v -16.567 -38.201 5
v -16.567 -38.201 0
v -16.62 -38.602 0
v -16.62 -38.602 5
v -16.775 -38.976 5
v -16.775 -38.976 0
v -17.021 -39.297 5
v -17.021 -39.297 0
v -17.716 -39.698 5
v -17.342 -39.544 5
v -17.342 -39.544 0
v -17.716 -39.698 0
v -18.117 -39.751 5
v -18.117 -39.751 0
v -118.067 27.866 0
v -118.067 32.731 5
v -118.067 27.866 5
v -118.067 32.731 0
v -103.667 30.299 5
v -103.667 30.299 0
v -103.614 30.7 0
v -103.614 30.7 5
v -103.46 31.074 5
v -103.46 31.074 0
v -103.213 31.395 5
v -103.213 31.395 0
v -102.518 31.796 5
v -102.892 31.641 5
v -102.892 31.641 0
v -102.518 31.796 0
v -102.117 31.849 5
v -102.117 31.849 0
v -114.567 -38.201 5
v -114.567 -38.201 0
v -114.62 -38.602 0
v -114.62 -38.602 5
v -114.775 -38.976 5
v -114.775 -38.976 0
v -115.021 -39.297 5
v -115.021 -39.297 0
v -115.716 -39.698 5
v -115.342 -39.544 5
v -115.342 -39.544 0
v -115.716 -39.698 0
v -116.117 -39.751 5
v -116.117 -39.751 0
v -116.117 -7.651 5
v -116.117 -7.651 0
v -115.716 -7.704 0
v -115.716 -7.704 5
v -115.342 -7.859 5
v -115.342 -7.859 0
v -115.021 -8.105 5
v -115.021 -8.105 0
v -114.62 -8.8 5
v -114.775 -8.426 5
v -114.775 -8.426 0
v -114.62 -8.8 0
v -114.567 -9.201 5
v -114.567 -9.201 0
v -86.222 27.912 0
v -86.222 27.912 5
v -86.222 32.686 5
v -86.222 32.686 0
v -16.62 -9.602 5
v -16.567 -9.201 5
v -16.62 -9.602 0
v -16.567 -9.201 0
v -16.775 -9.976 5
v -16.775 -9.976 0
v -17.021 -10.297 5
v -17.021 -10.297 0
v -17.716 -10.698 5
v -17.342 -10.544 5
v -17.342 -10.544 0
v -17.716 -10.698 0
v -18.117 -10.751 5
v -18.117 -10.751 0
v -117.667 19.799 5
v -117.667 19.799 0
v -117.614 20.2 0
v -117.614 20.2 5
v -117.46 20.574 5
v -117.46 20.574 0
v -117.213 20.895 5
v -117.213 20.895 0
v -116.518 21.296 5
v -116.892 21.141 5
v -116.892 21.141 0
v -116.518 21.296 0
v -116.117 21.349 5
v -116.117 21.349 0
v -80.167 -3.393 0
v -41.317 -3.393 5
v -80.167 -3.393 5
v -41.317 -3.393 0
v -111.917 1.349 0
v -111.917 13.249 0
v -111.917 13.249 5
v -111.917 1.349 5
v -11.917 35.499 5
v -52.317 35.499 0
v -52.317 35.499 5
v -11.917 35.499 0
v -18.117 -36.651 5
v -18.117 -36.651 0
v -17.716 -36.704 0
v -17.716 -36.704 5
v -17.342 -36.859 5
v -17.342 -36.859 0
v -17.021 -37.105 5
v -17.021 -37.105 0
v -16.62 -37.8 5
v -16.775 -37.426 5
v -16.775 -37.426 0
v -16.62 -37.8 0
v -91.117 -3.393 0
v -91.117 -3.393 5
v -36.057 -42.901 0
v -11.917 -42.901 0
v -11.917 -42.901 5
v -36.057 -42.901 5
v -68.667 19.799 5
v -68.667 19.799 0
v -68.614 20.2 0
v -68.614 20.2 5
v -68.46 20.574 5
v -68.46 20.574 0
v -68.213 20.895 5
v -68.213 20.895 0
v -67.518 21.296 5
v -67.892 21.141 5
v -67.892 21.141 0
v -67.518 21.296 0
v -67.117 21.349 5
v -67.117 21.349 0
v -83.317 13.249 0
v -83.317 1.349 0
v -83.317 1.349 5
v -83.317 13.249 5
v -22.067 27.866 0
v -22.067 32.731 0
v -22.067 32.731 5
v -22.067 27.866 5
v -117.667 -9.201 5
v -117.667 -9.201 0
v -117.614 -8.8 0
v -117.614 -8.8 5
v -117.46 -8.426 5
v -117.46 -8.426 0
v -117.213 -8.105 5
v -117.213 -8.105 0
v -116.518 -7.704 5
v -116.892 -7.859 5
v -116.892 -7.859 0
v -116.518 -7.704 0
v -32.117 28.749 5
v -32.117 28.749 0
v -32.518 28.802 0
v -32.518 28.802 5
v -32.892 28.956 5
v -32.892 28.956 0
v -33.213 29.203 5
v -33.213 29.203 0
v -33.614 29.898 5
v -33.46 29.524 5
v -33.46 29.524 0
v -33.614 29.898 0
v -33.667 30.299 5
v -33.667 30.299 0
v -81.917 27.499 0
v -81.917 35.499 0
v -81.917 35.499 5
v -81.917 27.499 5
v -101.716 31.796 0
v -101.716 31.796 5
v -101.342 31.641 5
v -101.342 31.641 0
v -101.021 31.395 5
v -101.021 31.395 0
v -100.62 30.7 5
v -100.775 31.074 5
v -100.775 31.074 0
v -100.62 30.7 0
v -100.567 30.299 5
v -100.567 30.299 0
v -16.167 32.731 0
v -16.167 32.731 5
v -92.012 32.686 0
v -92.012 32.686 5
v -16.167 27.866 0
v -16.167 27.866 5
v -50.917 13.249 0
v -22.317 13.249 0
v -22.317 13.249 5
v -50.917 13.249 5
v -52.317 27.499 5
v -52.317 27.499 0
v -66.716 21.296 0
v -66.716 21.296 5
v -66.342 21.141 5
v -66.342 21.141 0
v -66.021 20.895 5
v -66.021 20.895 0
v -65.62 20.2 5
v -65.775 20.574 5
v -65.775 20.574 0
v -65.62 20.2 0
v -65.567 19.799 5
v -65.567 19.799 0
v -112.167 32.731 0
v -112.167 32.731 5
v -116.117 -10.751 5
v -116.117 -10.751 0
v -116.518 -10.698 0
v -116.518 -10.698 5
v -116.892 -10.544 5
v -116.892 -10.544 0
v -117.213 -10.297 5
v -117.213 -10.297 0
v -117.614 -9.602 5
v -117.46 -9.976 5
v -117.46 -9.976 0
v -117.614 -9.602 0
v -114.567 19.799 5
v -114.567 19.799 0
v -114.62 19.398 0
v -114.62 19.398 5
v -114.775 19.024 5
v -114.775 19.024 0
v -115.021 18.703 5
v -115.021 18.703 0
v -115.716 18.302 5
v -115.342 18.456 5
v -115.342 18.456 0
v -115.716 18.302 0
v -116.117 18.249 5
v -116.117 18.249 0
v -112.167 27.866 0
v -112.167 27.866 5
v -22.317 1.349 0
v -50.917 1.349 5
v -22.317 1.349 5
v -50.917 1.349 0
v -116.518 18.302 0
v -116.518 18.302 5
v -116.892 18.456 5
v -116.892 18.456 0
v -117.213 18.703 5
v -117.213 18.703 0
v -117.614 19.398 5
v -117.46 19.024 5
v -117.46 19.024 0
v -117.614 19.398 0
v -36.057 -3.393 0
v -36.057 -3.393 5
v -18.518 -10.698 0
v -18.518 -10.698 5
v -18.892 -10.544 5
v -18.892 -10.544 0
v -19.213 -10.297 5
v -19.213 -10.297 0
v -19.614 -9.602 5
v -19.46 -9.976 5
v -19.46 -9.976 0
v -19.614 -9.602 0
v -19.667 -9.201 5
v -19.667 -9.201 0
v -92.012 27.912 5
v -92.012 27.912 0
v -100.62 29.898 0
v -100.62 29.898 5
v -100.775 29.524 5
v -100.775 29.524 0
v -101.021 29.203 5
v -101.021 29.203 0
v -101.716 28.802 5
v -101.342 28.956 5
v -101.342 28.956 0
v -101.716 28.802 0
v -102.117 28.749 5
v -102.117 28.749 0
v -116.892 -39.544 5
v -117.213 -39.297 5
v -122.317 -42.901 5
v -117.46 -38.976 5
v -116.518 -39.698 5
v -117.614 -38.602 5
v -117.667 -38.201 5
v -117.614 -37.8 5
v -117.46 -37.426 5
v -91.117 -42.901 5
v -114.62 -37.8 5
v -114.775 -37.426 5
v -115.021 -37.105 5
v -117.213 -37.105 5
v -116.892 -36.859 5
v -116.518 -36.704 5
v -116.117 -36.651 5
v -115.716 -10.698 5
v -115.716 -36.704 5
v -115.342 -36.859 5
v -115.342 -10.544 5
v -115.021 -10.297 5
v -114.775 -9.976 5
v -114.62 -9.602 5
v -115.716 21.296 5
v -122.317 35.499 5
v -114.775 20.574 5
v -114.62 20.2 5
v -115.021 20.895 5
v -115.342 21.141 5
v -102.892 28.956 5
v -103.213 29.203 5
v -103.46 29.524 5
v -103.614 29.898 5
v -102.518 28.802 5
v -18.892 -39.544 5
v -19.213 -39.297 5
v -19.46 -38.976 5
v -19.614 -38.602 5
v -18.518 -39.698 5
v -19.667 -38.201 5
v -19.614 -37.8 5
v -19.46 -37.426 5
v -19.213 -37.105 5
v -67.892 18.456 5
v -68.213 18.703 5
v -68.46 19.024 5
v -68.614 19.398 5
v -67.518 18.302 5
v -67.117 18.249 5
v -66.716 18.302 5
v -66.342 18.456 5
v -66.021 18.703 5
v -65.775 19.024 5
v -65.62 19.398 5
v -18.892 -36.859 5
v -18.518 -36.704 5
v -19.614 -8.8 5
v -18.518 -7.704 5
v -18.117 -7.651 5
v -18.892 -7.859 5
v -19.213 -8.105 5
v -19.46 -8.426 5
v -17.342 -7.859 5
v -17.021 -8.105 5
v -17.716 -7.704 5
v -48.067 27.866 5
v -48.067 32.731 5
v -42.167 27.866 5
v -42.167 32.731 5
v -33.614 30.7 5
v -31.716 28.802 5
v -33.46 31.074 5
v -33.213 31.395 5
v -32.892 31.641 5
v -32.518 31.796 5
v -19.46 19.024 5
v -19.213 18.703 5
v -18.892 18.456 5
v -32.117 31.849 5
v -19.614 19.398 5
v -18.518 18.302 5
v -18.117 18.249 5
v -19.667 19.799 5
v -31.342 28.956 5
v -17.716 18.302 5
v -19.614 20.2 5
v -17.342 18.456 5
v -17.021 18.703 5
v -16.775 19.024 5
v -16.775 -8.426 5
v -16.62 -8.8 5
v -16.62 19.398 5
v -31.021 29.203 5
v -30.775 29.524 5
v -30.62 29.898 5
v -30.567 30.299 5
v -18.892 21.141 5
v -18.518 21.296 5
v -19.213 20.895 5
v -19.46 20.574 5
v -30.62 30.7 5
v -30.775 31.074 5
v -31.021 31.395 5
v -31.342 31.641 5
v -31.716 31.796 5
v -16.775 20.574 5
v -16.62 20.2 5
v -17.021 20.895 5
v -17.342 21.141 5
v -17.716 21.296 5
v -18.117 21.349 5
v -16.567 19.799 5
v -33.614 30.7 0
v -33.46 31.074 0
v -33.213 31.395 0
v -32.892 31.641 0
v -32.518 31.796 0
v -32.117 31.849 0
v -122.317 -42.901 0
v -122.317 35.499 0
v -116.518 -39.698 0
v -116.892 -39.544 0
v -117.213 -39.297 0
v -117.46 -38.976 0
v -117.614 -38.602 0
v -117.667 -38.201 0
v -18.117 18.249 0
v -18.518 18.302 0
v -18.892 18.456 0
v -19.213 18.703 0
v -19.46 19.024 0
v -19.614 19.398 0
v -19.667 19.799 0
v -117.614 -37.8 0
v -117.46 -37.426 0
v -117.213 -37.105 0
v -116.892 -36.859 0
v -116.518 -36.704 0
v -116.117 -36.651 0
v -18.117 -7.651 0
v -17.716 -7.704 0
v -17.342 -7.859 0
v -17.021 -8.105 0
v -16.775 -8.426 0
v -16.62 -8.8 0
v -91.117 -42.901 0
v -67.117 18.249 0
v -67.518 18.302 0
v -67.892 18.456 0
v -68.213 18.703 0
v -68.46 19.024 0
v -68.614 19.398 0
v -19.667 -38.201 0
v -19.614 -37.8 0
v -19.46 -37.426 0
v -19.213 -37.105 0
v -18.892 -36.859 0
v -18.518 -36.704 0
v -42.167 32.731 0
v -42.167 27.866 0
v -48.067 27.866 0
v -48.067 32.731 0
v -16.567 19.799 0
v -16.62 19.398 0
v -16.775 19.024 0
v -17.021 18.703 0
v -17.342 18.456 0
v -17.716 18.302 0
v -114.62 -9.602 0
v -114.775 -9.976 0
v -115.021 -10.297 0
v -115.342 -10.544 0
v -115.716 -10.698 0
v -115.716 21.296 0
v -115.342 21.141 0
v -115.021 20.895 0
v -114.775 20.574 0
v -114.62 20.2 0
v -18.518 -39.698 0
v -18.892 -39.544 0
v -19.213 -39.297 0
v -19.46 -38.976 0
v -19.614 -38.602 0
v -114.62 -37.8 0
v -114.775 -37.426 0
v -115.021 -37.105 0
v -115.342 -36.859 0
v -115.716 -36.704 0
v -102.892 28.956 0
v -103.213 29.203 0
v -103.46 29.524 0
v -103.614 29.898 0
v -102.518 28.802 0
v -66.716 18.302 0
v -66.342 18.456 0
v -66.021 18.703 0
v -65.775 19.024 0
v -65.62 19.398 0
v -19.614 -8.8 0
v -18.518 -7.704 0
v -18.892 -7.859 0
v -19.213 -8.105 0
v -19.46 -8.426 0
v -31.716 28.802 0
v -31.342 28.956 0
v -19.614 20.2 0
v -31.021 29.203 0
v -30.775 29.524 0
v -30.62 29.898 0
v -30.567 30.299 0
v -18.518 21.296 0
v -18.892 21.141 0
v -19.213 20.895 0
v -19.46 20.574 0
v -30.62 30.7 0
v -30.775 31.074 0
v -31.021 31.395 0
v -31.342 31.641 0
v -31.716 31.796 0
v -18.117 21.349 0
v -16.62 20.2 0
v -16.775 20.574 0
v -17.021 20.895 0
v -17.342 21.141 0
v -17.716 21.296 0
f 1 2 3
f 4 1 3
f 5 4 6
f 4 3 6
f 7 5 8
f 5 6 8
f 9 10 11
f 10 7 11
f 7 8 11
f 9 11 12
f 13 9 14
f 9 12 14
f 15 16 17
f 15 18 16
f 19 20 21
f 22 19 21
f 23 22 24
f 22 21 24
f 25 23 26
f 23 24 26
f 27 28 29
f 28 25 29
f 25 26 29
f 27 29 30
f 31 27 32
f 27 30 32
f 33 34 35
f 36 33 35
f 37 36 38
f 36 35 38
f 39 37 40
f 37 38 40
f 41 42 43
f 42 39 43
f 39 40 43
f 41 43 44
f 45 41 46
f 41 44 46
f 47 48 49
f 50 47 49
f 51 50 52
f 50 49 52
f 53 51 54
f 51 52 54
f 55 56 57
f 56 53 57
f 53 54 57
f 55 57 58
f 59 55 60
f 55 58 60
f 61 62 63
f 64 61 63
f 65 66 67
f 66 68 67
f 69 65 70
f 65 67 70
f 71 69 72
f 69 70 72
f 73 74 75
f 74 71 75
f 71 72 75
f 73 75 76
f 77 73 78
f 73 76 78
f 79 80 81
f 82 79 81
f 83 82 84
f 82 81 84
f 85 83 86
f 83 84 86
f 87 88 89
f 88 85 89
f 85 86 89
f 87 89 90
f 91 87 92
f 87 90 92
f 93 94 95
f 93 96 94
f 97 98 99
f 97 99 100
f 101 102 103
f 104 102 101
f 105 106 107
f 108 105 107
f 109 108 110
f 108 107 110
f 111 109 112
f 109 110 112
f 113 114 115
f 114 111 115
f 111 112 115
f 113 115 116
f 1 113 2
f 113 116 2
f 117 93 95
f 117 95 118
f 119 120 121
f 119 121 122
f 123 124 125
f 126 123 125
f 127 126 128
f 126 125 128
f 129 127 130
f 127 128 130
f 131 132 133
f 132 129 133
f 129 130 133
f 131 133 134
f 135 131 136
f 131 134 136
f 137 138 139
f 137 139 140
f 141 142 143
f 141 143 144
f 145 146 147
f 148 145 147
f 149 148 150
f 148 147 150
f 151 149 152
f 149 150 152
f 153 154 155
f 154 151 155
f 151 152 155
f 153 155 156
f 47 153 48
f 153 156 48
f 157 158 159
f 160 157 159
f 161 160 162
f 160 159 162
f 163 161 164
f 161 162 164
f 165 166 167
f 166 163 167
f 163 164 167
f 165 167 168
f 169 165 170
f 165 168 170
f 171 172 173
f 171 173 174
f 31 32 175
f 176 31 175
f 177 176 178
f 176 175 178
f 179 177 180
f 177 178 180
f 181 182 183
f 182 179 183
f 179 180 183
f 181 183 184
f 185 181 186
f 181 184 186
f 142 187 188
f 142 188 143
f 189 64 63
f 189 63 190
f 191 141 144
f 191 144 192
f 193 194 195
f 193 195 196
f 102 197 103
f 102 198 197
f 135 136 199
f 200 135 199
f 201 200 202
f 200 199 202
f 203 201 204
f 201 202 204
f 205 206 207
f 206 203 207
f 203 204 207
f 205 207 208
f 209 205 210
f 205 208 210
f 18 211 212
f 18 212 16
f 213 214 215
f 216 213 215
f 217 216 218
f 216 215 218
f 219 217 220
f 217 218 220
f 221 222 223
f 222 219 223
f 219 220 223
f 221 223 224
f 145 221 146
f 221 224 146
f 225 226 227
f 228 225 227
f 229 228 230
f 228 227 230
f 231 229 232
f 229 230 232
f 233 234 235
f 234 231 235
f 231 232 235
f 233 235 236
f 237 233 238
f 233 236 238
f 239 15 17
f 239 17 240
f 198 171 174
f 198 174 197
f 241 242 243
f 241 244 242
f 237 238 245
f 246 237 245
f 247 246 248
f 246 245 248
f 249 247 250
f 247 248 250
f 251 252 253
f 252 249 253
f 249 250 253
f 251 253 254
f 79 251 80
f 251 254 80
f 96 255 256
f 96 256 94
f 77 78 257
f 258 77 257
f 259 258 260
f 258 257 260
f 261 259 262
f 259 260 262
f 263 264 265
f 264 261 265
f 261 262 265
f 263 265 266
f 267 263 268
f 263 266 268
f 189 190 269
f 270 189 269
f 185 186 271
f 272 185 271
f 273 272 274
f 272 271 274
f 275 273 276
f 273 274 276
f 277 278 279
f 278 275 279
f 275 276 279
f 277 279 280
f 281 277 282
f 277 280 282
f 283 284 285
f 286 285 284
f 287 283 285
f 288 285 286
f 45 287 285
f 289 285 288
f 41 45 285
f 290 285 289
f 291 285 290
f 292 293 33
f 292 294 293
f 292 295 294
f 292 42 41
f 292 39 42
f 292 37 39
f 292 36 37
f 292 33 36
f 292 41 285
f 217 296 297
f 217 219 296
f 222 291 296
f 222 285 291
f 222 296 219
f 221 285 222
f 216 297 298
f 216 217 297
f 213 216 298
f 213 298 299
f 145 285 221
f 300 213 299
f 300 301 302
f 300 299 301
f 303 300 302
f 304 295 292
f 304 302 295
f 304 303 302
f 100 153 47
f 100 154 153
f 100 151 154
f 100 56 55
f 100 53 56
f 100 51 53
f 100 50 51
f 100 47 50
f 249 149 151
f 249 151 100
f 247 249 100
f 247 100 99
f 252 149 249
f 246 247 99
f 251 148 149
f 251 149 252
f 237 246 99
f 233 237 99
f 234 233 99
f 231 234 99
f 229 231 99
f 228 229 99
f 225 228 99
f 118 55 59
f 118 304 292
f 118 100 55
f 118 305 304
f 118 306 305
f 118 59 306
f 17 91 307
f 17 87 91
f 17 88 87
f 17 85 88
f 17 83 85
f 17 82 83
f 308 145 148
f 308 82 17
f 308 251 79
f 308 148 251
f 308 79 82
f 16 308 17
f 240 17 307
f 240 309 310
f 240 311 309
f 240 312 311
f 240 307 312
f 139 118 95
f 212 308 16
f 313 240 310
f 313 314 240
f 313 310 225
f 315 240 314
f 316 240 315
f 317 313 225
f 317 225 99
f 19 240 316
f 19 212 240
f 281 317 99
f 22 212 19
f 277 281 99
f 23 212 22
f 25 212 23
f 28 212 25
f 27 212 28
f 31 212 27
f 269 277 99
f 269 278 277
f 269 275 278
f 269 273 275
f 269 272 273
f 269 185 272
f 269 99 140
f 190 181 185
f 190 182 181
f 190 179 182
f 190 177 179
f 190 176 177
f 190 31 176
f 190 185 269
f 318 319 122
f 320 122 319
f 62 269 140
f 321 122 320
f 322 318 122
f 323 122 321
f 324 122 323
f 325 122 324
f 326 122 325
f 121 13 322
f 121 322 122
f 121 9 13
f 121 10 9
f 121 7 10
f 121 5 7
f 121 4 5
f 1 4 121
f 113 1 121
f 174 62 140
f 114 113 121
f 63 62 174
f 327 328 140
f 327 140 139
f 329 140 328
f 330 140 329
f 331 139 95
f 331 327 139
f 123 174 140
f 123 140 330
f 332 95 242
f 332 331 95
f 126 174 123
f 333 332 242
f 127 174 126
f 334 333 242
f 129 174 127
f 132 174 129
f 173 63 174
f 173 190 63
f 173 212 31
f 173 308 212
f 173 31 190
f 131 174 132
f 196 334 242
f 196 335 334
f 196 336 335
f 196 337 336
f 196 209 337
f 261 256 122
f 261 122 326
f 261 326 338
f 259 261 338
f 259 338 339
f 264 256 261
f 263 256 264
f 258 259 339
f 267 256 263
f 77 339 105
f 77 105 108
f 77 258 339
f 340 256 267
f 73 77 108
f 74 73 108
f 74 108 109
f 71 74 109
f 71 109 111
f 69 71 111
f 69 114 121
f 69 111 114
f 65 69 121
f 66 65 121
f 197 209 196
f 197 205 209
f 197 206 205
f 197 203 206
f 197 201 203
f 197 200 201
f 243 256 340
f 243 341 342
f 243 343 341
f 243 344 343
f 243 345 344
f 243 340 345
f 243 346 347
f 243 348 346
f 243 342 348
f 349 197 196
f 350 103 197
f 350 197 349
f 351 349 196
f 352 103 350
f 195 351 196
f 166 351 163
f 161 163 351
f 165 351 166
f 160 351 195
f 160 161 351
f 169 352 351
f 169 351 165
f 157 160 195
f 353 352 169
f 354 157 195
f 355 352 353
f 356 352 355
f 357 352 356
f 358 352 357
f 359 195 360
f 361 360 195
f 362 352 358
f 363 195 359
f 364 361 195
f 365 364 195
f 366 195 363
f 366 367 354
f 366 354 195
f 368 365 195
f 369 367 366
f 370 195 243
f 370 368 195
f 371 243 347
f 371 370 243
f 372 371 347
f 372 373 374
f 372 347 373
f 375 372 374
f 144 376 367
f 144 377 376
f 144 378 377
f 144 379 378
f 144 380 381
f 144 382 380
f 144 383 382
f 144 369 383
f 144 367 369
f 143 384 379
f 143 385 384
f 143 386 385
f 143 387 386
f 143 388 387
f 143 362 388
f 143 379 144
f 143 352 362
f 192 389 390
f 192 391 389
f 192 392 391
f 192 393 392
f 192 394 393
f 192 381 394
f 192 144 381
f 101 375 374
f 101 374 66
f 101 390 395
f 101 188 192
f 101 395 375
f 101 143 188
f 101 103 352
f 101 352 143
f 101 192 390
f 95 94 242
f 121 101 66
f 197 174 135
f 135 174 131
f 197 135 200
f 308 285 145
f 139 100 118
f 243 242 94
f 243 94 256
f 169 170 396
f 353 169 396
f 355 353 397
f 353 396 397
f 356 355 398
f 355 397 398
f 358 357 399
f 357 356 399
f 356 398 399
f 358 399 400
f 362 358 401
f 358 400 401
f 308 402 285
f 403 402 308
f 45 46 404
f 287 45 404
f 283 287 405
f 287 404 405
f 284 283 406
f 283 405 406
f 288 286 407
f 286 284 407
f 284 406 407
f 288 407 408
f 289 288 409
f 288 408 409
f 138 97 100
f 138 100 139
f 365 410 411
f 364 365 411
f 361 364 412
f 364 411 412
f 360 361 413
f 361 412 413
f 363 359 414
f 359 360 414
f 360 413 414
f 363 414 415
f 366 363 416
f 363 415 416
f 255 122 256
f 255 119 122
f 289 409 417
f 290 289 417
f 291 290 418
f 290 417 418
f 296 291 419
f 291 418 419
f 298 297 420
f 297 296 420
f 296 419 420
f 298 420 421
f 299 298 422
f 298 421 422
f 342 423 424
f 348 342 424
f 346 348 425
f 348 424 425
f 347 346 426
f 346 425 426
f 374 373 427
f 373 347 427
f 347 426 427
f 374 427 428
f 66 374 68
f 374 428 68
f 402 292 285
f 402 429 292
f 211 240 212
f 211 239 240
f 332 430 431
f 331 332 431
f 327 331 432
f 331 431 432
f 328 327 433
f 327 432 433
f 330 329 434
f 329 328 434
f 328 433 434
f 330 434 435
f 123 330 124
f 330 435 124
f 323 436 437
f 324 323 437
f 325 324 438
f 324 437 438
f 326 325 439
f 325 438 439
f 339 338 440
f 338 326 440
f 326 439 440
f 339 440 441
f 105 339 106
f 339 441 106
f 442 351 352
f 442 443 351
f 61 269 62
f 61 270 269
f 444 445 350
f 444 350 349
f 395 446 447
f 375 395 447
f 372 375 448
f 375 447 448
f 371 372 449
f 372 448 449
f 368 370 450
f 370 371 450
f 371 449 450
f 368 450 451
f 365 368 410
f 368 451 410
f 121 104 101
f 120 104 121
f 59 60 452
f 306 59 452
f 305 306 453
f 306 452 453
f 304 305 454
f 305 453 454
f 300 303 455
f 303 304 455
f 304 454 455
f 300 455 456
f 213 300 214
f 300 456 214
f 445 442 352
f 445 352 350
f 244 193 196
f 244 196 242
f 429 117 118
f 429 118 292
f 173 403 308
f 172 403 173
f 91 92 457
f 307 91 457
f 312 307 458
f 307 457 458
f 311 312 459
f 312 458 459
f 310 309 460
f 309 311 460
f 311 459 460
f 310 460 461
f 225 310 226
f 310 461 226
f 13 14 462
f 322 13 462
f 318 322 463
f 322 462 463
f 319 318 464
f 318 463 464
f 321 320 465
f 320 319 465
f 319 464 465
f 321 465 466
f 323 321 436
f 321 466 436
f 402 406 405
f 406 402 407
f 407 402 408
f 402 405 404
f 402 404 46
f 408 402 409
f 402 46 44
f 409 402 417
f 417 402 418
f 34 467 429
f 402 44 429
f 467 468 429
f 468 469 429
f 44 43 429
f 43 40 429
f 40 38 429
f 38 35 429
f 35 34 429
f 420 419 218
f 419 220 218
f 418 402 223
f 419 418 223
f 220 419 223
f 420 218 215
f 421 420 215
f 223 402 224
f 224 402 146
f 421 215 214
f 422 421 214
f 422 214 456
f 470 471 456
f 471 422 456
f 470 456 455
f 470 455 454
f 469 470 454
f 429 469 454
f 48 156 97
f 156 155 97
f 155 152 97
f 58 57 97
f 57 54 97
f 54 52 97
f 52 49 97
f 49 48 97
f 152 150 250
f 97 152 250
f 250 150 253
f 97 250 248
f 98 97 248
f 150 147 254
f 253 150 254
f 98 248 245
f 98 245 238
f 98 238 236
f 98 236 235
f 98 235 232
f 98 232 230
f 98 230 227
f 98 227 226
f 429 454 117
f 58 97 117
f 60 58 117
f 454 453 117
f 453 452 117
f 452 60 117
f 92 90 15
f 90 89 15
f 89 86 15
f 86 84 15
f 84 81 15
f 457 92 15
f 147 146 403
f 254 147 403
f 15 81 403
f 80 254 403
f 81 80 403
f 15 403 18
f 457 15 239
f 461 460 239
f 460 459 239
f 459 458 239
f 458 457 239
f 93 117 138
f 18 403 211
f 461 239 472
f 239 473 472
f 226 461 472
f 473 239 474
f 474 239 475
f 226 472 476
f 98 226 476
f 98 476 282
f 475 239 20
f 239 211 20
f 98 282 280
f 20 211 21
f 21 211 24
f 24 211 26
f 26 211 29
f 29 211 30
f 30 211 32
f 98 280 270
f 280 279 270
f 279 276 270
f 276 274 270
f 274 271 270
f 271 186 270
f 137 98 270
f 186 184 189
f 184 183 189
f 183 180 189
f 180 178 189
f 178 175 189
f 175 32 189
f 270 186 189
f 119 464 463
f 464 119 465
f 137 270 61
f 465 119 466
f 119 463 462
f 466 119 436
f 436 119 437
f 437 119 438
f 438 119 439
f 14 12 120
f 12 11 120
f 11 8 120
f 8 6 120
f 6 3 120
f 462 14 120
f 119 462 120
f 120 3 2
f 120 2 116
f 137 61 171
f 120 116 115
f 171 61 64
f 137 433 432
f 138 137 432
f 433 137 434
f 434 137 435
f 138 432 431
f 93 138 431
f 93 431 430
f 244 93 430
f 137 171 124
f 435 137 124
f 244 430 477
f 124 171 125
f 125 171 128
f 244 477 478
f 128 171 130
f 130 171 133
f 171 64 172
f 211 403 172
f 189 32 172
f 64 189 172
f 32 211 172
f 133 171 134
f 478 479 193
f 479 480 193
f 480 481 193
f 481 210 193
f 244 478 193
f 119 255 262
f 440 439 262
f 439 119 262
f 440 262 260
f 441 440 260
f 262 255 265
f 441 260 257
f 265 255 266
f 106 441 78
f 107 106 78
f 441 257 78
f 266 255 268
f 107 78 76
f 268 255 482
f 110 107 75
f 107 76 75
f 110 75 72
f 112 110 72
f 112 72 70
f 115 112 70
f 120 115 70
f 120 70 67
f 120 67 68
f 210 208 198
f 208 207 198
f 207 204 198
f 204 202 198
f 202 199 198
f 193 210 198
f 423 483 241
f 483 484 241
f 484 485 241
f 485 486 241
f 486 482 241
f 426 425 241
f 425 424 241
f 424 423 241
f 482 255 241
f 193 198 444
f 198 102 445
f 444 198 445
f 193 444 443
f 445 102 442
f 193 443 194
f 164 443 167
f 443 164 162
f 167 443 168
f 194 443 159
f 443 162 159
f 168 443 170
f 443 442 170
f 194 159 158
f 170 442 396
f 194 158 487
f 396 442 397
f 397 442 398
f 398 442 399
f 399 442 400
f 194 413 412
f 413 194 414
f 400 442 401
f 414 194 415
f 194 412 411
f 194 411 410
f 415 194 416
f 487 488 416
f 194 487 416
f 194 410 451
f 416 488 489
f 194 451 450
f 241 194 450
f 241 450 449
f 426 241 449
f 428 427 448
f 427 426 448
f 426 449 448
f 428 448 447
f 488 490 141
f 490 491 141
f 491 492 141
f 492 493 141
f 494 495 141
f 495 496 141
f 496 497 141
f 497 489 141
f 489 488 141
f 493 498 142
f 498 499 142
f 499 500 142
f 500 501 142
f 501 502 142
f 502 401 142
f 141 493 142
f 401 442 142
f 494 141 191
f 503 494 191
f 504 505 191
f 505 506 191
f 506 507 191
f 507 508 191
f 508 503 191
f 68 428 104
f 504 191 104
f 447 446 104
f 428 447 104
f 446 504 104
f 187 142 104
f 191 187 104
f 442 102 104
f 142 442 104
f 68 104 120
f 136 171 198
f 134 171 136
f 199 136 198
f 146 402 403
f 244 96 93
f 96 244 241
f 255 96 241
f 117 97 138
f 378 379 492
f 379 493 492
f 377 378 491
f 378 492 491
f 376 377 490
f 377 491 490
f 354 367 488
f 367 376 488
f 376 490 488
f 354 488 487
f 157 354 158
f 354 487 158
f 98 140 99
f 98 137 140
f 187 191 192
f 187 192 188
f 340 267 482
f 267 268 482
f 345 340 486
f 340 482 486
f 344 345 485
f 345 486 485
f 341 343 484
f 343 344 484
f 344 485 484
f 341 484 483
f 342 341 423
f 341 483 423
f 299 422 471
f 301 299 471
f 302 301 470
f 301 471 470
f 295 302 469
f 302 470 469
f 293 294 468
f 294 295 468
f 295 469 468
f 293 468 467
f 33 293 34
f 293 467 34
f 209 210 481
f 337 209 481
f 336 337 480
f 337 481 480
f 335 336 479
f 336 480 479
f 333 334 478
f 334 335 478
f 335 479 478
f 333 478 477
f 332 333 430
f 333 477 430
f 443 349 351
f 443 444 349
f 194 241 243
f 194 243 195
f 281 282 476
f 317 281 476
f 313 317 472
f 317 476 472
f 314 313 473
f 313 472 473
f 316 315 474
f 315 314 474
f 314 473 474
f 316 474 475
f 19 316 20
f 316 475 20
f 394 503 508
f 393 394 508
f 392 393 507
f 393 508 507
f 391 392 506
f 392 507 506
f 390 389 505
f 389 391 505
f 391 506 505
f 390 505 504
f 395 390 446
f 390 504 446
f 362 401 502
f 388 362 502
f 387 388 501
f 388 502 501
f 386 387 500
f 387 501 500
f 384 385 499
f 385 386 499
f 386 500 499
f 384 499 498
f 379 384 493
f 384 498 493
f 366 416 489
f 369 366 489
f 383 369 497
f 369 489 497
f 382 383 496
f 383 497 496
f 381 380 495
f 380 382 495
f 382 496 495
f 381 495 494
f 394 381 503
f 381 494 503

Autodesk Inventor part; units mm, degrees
ref_plane "YZ Plane" through (0, 0, 0) normal (1, 0, 0) x (0, 1, 0)
ref_plane "XZ Plane" through (0, 0, 0) normal (0, 1, 0) x (-1, 0, 0)
ref_plane "XY Plane" through (0, 0, 0) normal (0, 0, 1) x (1, 0, 0)
sketch "Boceto1" plane through (0, 0, 0) normal (0, 0, 1) x (1, 0, 0)
  arc A0 (-116.1173, 21.3488) -> (-117.6673, 19.7988) centre (-116.1173, 19.7988) ccw
  arc A1 (-117.6673, 19.7988) -> (-116.1173, 18.2488) centre (-116.1173, 19.7988) ccw
  arc A2 (-116.1173, 18.2488) -> (-114.5673, 19.7988) centre (-116.1173, 19.7988) ccw
  arc A3 (-114.5673, 19.7988) -> (-116.1173, 21.3488) centre (-116.1173, 19.7988) ccw
  arc A4 (-67.1173, 21.3488) -> (-68.6673, 19.7988) centre (-67.1173, 19.7988) ccw
  arc A5 (-68.6673, 19.7988) -> (-67.1173, 18.2488) centre (-67.1173, 19.7988) ccw
  arc A6 (-67.1173, 18.2488) -> (-65.5673, 19.7988) centre (-67.1173, 19.7988) ccw
  arc A7 (-65.5673, 19.7988) -> (-67.1173, 21.3488) centre (-67.1173, 19.7988) ccw
  arc A8 (-18.1173, 21.3488) -> (-19.6673, 19.7988) centre (-18.1173, 19.7988) ccw
  arc A9 (-19.6673, 19.7988) -> (-18.1173, 18.2488) centre (-18.1173, 19.7988) ccw
  arc A10 (-18.1173, 18.2488) -> (-16.5673, 19.7988) centre (-18.1173, 19.7988) ccw
  arc A11 (-16.5673, 19.7988) -> (-18.1173, 21.3488) centre (-18.1173, 19.7988) ccw
  arc A12 (-18.1173, -7.6512) -> (-19.6673, -9.2012) centre (-18.1173, -9.2012) ccw
  arc A13 (-19.6673, -9.2012) -> (-18.1173, -10.7512) centre (-18.1173, -9.2012) ccw
  arc A14 (-18.1173, -10.7512) -> (-16.5673, -9.2012) centre (-18.1173, -9.2012) ccw
  arc A15 (-16.5673, -9.2012) -> (-18.1173, -7.6512) centre (-18.1173, -9.2012) ccw
  arc A16 (-116.1173, -7.6512) -> (-117.6673, -9.2012) centre (-116.1173, -9.2012) ccw
  arc A17 (-117.6673, -9.2012) -> (-116.1173, -10.7512) centre (-116.1173, -9.2012) ccw
  arc A18 (-116.1173, -10.7512) -> (-114.5673, -9.2012) centre (-116.1173, -9.2012) ccw
  arc A19 (-114.5673, -9.2012) -> (-116.1173, -7.6512) centre (-116.1173, -9.2012) ccw
  arc A20 (-116.1173, -36.6512) -> (-117.6673, -38.2012) centre (-116.1173, -38.2012) ccw
  arc A21 (-117.6673, -38.2012) -> (-116.1173, -39.7512) centre (-116.1173, -38.2012) ccw
  arc A22 (-116.1173, -39.7512) -> (-114.5673, -38.2012) centre (-116.1173, -38.2012) ccw
  arc A23 (-114.5673, -38.2012) -> (-116.1173, -36.6512) centre (-116.1173, -38.2012) ccw
  arc A24 (-18.1173, -36.6512) -> (-19.6673, -38.2012) centre (-18.1173, -38.2012) ccw
  arc A25 (-19.6673, -38.2012) -> (-18.1173, -39.7512) centre (-18.1173, -38.2012) ccw
  arc A26 (-18.1173, -39.7512) -> (-16.5673, -38.2012) centre (-18.1173, -38.2012) ccw
  arc A27 (-16.5673, -38.2012) -> (-18.1173, -36.6512) centre (-18.1173, -38.2012) ccw
  arc A28 (-102.1173, 31.8488) -> (-103.6673, 30.2988) centre (-102.1173, 30.2988) ccw
  arc A29 (-103.6673, 30.2988) -> (-102.1173, 28.7488) centre (-102.1173, 30.2988) ccw
  arc A30 (-102.1173, 28.7488) -> (-100.5673, 30.2988) centre (-102.1173, 30.2988) ccw
  arc A31 (-100.5673, 30.2988) -> (-102.1173, 31.8488) centre (-102.1173, 30.2988) ccw
  arc A32 (-32.1173, 31.8488) -> (-33.6673, 30.2988) centre (-32.1173, 30.2988) ccw
  arc A33 (-33.6673, 30.2988) -> (-32.1173, 28.7488) centre (-32.1173, 30.2988) ccw
  arc A34 (-32.1173, 28.7488) -> (-30.5673, 30.2988) centre (-32.1173, 30.2988) ccw
  arc A35 (-30.5673, 30.2988) -> (-32.1173, 31.8488) centre (-32.1173, 30.2988) ccw
  line L0 (-22.3173, 1.3488) -> (-22.3173, 13.2488)
  line L1 (-22.3173, 13.2488) -> (-50.9173, 13.2488)
  line L2 (-50.9173, 13.2488) -> (-50.9173, 1.3488)
  line L3 (-50.9173, 1.3488) -> (-22.3173, 1.3488)
  line L4 (-83.3173, 1.3488) -> (-83.3173, 13.2488)
  line L5 (-83.3173, 13.2488) -> (-111.9173, 13.2488)
  line L6 (-111.9173, 13.2488) -> (-111.9173, 1.3488)
  line L7 (-111.9173, 1.3488) -> (-83.3173, 1.3488)
  line L8 (-86.2223, 27.9117) -> (-86.2223, 32.6859)
  line L9 (-86.2223, 32.6859) -> (-92.0123, 32.6859)
  line L10 (-92.0123, 32.6859) -> (-92.0123, 27.9117)
  line L11 (-92.0123, 27.9117) -> (-86.2223, 27.9117)
  line L12 (-112.1673, 27.8663) -> (-112.1673, 32.7313)
  line L13 (-112.1673, 32.7313) -> (-118.0673, 32.7313)
  line L14 (-118.0673, 32.7313) -> (-118.0673, 27.8663)
  line L15 (-118.0673, 27.8663) -> (-112.1673, 27.8663)
  line L16 (-42.1673, 27.8663) -> (-42.1673, 32.7313)
  line L17 (-42.1673, 32.7313) -> (-48.0673, 32.7313)
  line L18 (-48.0673, 32.7313) -> (-48.0673, 27.8663)
  line L19 (-48.0673, 27.8663) -> (-42.1673, 27.8663)
  line L20 (-16.1673, 27.8663) -> (-16.1673, 32.7313)
  line L21 (-16.1673, 32.7313) -> (-22.0673, 32.7313)
  line L22 (-22.0673, 32.7313) -> (-22.0673, 27.8663)
  line L23 (-22.0673, 27.8663) -> (-16.1673, 27.8663)
  line L24 (-36.0566, -42.9012) -> (-36.0566, -3.3934)
  line L25 (-36.0566, -3.3934) -> (-41.3173, -3.3934)
  line L26 (-41.3173, -3.3934) -> (-80.1673, -3.3934)
  line L27 (-80.1673, -3.3934) -> (-91.1173, -3.3934)
  line L28 (-91.1173, -3.3934) -> (-91.1173, -42.9012)
  line L29 (-91.1173, -42.9012) -> (-122.3173, -42.9012)
  line L30 (-122.3173, -42.9012) -> (-122.3173, 35.4988)
  line L31 (-122.3173, 35.4988) -> (-81.9173, 35.4988)
  line L32 (-81.9173, 35.4988) -> (-81.9173, 27.4988)
  line L33 (-81.9173, 27.4988) -> (-52.3173, 27.4988)
  line L34 (-52.3173, 27.4988) -> (-52.3173, 35.4988)
  line L35 (-52.3173, 35.4988) -> (-11.9173, 35.4988)
  line L36 (-11.9173, 35.4988) -> (-11.9173, -42.9012)
  line L37 (-11.9173, -42.9012) -> (-36.0566, -42.9012)
  point P0 (0, 0)
extrude "Extrusión1" add sketch "Boceto1" along normal blind 5
properties part number "carro x lado motor pieza 1"
